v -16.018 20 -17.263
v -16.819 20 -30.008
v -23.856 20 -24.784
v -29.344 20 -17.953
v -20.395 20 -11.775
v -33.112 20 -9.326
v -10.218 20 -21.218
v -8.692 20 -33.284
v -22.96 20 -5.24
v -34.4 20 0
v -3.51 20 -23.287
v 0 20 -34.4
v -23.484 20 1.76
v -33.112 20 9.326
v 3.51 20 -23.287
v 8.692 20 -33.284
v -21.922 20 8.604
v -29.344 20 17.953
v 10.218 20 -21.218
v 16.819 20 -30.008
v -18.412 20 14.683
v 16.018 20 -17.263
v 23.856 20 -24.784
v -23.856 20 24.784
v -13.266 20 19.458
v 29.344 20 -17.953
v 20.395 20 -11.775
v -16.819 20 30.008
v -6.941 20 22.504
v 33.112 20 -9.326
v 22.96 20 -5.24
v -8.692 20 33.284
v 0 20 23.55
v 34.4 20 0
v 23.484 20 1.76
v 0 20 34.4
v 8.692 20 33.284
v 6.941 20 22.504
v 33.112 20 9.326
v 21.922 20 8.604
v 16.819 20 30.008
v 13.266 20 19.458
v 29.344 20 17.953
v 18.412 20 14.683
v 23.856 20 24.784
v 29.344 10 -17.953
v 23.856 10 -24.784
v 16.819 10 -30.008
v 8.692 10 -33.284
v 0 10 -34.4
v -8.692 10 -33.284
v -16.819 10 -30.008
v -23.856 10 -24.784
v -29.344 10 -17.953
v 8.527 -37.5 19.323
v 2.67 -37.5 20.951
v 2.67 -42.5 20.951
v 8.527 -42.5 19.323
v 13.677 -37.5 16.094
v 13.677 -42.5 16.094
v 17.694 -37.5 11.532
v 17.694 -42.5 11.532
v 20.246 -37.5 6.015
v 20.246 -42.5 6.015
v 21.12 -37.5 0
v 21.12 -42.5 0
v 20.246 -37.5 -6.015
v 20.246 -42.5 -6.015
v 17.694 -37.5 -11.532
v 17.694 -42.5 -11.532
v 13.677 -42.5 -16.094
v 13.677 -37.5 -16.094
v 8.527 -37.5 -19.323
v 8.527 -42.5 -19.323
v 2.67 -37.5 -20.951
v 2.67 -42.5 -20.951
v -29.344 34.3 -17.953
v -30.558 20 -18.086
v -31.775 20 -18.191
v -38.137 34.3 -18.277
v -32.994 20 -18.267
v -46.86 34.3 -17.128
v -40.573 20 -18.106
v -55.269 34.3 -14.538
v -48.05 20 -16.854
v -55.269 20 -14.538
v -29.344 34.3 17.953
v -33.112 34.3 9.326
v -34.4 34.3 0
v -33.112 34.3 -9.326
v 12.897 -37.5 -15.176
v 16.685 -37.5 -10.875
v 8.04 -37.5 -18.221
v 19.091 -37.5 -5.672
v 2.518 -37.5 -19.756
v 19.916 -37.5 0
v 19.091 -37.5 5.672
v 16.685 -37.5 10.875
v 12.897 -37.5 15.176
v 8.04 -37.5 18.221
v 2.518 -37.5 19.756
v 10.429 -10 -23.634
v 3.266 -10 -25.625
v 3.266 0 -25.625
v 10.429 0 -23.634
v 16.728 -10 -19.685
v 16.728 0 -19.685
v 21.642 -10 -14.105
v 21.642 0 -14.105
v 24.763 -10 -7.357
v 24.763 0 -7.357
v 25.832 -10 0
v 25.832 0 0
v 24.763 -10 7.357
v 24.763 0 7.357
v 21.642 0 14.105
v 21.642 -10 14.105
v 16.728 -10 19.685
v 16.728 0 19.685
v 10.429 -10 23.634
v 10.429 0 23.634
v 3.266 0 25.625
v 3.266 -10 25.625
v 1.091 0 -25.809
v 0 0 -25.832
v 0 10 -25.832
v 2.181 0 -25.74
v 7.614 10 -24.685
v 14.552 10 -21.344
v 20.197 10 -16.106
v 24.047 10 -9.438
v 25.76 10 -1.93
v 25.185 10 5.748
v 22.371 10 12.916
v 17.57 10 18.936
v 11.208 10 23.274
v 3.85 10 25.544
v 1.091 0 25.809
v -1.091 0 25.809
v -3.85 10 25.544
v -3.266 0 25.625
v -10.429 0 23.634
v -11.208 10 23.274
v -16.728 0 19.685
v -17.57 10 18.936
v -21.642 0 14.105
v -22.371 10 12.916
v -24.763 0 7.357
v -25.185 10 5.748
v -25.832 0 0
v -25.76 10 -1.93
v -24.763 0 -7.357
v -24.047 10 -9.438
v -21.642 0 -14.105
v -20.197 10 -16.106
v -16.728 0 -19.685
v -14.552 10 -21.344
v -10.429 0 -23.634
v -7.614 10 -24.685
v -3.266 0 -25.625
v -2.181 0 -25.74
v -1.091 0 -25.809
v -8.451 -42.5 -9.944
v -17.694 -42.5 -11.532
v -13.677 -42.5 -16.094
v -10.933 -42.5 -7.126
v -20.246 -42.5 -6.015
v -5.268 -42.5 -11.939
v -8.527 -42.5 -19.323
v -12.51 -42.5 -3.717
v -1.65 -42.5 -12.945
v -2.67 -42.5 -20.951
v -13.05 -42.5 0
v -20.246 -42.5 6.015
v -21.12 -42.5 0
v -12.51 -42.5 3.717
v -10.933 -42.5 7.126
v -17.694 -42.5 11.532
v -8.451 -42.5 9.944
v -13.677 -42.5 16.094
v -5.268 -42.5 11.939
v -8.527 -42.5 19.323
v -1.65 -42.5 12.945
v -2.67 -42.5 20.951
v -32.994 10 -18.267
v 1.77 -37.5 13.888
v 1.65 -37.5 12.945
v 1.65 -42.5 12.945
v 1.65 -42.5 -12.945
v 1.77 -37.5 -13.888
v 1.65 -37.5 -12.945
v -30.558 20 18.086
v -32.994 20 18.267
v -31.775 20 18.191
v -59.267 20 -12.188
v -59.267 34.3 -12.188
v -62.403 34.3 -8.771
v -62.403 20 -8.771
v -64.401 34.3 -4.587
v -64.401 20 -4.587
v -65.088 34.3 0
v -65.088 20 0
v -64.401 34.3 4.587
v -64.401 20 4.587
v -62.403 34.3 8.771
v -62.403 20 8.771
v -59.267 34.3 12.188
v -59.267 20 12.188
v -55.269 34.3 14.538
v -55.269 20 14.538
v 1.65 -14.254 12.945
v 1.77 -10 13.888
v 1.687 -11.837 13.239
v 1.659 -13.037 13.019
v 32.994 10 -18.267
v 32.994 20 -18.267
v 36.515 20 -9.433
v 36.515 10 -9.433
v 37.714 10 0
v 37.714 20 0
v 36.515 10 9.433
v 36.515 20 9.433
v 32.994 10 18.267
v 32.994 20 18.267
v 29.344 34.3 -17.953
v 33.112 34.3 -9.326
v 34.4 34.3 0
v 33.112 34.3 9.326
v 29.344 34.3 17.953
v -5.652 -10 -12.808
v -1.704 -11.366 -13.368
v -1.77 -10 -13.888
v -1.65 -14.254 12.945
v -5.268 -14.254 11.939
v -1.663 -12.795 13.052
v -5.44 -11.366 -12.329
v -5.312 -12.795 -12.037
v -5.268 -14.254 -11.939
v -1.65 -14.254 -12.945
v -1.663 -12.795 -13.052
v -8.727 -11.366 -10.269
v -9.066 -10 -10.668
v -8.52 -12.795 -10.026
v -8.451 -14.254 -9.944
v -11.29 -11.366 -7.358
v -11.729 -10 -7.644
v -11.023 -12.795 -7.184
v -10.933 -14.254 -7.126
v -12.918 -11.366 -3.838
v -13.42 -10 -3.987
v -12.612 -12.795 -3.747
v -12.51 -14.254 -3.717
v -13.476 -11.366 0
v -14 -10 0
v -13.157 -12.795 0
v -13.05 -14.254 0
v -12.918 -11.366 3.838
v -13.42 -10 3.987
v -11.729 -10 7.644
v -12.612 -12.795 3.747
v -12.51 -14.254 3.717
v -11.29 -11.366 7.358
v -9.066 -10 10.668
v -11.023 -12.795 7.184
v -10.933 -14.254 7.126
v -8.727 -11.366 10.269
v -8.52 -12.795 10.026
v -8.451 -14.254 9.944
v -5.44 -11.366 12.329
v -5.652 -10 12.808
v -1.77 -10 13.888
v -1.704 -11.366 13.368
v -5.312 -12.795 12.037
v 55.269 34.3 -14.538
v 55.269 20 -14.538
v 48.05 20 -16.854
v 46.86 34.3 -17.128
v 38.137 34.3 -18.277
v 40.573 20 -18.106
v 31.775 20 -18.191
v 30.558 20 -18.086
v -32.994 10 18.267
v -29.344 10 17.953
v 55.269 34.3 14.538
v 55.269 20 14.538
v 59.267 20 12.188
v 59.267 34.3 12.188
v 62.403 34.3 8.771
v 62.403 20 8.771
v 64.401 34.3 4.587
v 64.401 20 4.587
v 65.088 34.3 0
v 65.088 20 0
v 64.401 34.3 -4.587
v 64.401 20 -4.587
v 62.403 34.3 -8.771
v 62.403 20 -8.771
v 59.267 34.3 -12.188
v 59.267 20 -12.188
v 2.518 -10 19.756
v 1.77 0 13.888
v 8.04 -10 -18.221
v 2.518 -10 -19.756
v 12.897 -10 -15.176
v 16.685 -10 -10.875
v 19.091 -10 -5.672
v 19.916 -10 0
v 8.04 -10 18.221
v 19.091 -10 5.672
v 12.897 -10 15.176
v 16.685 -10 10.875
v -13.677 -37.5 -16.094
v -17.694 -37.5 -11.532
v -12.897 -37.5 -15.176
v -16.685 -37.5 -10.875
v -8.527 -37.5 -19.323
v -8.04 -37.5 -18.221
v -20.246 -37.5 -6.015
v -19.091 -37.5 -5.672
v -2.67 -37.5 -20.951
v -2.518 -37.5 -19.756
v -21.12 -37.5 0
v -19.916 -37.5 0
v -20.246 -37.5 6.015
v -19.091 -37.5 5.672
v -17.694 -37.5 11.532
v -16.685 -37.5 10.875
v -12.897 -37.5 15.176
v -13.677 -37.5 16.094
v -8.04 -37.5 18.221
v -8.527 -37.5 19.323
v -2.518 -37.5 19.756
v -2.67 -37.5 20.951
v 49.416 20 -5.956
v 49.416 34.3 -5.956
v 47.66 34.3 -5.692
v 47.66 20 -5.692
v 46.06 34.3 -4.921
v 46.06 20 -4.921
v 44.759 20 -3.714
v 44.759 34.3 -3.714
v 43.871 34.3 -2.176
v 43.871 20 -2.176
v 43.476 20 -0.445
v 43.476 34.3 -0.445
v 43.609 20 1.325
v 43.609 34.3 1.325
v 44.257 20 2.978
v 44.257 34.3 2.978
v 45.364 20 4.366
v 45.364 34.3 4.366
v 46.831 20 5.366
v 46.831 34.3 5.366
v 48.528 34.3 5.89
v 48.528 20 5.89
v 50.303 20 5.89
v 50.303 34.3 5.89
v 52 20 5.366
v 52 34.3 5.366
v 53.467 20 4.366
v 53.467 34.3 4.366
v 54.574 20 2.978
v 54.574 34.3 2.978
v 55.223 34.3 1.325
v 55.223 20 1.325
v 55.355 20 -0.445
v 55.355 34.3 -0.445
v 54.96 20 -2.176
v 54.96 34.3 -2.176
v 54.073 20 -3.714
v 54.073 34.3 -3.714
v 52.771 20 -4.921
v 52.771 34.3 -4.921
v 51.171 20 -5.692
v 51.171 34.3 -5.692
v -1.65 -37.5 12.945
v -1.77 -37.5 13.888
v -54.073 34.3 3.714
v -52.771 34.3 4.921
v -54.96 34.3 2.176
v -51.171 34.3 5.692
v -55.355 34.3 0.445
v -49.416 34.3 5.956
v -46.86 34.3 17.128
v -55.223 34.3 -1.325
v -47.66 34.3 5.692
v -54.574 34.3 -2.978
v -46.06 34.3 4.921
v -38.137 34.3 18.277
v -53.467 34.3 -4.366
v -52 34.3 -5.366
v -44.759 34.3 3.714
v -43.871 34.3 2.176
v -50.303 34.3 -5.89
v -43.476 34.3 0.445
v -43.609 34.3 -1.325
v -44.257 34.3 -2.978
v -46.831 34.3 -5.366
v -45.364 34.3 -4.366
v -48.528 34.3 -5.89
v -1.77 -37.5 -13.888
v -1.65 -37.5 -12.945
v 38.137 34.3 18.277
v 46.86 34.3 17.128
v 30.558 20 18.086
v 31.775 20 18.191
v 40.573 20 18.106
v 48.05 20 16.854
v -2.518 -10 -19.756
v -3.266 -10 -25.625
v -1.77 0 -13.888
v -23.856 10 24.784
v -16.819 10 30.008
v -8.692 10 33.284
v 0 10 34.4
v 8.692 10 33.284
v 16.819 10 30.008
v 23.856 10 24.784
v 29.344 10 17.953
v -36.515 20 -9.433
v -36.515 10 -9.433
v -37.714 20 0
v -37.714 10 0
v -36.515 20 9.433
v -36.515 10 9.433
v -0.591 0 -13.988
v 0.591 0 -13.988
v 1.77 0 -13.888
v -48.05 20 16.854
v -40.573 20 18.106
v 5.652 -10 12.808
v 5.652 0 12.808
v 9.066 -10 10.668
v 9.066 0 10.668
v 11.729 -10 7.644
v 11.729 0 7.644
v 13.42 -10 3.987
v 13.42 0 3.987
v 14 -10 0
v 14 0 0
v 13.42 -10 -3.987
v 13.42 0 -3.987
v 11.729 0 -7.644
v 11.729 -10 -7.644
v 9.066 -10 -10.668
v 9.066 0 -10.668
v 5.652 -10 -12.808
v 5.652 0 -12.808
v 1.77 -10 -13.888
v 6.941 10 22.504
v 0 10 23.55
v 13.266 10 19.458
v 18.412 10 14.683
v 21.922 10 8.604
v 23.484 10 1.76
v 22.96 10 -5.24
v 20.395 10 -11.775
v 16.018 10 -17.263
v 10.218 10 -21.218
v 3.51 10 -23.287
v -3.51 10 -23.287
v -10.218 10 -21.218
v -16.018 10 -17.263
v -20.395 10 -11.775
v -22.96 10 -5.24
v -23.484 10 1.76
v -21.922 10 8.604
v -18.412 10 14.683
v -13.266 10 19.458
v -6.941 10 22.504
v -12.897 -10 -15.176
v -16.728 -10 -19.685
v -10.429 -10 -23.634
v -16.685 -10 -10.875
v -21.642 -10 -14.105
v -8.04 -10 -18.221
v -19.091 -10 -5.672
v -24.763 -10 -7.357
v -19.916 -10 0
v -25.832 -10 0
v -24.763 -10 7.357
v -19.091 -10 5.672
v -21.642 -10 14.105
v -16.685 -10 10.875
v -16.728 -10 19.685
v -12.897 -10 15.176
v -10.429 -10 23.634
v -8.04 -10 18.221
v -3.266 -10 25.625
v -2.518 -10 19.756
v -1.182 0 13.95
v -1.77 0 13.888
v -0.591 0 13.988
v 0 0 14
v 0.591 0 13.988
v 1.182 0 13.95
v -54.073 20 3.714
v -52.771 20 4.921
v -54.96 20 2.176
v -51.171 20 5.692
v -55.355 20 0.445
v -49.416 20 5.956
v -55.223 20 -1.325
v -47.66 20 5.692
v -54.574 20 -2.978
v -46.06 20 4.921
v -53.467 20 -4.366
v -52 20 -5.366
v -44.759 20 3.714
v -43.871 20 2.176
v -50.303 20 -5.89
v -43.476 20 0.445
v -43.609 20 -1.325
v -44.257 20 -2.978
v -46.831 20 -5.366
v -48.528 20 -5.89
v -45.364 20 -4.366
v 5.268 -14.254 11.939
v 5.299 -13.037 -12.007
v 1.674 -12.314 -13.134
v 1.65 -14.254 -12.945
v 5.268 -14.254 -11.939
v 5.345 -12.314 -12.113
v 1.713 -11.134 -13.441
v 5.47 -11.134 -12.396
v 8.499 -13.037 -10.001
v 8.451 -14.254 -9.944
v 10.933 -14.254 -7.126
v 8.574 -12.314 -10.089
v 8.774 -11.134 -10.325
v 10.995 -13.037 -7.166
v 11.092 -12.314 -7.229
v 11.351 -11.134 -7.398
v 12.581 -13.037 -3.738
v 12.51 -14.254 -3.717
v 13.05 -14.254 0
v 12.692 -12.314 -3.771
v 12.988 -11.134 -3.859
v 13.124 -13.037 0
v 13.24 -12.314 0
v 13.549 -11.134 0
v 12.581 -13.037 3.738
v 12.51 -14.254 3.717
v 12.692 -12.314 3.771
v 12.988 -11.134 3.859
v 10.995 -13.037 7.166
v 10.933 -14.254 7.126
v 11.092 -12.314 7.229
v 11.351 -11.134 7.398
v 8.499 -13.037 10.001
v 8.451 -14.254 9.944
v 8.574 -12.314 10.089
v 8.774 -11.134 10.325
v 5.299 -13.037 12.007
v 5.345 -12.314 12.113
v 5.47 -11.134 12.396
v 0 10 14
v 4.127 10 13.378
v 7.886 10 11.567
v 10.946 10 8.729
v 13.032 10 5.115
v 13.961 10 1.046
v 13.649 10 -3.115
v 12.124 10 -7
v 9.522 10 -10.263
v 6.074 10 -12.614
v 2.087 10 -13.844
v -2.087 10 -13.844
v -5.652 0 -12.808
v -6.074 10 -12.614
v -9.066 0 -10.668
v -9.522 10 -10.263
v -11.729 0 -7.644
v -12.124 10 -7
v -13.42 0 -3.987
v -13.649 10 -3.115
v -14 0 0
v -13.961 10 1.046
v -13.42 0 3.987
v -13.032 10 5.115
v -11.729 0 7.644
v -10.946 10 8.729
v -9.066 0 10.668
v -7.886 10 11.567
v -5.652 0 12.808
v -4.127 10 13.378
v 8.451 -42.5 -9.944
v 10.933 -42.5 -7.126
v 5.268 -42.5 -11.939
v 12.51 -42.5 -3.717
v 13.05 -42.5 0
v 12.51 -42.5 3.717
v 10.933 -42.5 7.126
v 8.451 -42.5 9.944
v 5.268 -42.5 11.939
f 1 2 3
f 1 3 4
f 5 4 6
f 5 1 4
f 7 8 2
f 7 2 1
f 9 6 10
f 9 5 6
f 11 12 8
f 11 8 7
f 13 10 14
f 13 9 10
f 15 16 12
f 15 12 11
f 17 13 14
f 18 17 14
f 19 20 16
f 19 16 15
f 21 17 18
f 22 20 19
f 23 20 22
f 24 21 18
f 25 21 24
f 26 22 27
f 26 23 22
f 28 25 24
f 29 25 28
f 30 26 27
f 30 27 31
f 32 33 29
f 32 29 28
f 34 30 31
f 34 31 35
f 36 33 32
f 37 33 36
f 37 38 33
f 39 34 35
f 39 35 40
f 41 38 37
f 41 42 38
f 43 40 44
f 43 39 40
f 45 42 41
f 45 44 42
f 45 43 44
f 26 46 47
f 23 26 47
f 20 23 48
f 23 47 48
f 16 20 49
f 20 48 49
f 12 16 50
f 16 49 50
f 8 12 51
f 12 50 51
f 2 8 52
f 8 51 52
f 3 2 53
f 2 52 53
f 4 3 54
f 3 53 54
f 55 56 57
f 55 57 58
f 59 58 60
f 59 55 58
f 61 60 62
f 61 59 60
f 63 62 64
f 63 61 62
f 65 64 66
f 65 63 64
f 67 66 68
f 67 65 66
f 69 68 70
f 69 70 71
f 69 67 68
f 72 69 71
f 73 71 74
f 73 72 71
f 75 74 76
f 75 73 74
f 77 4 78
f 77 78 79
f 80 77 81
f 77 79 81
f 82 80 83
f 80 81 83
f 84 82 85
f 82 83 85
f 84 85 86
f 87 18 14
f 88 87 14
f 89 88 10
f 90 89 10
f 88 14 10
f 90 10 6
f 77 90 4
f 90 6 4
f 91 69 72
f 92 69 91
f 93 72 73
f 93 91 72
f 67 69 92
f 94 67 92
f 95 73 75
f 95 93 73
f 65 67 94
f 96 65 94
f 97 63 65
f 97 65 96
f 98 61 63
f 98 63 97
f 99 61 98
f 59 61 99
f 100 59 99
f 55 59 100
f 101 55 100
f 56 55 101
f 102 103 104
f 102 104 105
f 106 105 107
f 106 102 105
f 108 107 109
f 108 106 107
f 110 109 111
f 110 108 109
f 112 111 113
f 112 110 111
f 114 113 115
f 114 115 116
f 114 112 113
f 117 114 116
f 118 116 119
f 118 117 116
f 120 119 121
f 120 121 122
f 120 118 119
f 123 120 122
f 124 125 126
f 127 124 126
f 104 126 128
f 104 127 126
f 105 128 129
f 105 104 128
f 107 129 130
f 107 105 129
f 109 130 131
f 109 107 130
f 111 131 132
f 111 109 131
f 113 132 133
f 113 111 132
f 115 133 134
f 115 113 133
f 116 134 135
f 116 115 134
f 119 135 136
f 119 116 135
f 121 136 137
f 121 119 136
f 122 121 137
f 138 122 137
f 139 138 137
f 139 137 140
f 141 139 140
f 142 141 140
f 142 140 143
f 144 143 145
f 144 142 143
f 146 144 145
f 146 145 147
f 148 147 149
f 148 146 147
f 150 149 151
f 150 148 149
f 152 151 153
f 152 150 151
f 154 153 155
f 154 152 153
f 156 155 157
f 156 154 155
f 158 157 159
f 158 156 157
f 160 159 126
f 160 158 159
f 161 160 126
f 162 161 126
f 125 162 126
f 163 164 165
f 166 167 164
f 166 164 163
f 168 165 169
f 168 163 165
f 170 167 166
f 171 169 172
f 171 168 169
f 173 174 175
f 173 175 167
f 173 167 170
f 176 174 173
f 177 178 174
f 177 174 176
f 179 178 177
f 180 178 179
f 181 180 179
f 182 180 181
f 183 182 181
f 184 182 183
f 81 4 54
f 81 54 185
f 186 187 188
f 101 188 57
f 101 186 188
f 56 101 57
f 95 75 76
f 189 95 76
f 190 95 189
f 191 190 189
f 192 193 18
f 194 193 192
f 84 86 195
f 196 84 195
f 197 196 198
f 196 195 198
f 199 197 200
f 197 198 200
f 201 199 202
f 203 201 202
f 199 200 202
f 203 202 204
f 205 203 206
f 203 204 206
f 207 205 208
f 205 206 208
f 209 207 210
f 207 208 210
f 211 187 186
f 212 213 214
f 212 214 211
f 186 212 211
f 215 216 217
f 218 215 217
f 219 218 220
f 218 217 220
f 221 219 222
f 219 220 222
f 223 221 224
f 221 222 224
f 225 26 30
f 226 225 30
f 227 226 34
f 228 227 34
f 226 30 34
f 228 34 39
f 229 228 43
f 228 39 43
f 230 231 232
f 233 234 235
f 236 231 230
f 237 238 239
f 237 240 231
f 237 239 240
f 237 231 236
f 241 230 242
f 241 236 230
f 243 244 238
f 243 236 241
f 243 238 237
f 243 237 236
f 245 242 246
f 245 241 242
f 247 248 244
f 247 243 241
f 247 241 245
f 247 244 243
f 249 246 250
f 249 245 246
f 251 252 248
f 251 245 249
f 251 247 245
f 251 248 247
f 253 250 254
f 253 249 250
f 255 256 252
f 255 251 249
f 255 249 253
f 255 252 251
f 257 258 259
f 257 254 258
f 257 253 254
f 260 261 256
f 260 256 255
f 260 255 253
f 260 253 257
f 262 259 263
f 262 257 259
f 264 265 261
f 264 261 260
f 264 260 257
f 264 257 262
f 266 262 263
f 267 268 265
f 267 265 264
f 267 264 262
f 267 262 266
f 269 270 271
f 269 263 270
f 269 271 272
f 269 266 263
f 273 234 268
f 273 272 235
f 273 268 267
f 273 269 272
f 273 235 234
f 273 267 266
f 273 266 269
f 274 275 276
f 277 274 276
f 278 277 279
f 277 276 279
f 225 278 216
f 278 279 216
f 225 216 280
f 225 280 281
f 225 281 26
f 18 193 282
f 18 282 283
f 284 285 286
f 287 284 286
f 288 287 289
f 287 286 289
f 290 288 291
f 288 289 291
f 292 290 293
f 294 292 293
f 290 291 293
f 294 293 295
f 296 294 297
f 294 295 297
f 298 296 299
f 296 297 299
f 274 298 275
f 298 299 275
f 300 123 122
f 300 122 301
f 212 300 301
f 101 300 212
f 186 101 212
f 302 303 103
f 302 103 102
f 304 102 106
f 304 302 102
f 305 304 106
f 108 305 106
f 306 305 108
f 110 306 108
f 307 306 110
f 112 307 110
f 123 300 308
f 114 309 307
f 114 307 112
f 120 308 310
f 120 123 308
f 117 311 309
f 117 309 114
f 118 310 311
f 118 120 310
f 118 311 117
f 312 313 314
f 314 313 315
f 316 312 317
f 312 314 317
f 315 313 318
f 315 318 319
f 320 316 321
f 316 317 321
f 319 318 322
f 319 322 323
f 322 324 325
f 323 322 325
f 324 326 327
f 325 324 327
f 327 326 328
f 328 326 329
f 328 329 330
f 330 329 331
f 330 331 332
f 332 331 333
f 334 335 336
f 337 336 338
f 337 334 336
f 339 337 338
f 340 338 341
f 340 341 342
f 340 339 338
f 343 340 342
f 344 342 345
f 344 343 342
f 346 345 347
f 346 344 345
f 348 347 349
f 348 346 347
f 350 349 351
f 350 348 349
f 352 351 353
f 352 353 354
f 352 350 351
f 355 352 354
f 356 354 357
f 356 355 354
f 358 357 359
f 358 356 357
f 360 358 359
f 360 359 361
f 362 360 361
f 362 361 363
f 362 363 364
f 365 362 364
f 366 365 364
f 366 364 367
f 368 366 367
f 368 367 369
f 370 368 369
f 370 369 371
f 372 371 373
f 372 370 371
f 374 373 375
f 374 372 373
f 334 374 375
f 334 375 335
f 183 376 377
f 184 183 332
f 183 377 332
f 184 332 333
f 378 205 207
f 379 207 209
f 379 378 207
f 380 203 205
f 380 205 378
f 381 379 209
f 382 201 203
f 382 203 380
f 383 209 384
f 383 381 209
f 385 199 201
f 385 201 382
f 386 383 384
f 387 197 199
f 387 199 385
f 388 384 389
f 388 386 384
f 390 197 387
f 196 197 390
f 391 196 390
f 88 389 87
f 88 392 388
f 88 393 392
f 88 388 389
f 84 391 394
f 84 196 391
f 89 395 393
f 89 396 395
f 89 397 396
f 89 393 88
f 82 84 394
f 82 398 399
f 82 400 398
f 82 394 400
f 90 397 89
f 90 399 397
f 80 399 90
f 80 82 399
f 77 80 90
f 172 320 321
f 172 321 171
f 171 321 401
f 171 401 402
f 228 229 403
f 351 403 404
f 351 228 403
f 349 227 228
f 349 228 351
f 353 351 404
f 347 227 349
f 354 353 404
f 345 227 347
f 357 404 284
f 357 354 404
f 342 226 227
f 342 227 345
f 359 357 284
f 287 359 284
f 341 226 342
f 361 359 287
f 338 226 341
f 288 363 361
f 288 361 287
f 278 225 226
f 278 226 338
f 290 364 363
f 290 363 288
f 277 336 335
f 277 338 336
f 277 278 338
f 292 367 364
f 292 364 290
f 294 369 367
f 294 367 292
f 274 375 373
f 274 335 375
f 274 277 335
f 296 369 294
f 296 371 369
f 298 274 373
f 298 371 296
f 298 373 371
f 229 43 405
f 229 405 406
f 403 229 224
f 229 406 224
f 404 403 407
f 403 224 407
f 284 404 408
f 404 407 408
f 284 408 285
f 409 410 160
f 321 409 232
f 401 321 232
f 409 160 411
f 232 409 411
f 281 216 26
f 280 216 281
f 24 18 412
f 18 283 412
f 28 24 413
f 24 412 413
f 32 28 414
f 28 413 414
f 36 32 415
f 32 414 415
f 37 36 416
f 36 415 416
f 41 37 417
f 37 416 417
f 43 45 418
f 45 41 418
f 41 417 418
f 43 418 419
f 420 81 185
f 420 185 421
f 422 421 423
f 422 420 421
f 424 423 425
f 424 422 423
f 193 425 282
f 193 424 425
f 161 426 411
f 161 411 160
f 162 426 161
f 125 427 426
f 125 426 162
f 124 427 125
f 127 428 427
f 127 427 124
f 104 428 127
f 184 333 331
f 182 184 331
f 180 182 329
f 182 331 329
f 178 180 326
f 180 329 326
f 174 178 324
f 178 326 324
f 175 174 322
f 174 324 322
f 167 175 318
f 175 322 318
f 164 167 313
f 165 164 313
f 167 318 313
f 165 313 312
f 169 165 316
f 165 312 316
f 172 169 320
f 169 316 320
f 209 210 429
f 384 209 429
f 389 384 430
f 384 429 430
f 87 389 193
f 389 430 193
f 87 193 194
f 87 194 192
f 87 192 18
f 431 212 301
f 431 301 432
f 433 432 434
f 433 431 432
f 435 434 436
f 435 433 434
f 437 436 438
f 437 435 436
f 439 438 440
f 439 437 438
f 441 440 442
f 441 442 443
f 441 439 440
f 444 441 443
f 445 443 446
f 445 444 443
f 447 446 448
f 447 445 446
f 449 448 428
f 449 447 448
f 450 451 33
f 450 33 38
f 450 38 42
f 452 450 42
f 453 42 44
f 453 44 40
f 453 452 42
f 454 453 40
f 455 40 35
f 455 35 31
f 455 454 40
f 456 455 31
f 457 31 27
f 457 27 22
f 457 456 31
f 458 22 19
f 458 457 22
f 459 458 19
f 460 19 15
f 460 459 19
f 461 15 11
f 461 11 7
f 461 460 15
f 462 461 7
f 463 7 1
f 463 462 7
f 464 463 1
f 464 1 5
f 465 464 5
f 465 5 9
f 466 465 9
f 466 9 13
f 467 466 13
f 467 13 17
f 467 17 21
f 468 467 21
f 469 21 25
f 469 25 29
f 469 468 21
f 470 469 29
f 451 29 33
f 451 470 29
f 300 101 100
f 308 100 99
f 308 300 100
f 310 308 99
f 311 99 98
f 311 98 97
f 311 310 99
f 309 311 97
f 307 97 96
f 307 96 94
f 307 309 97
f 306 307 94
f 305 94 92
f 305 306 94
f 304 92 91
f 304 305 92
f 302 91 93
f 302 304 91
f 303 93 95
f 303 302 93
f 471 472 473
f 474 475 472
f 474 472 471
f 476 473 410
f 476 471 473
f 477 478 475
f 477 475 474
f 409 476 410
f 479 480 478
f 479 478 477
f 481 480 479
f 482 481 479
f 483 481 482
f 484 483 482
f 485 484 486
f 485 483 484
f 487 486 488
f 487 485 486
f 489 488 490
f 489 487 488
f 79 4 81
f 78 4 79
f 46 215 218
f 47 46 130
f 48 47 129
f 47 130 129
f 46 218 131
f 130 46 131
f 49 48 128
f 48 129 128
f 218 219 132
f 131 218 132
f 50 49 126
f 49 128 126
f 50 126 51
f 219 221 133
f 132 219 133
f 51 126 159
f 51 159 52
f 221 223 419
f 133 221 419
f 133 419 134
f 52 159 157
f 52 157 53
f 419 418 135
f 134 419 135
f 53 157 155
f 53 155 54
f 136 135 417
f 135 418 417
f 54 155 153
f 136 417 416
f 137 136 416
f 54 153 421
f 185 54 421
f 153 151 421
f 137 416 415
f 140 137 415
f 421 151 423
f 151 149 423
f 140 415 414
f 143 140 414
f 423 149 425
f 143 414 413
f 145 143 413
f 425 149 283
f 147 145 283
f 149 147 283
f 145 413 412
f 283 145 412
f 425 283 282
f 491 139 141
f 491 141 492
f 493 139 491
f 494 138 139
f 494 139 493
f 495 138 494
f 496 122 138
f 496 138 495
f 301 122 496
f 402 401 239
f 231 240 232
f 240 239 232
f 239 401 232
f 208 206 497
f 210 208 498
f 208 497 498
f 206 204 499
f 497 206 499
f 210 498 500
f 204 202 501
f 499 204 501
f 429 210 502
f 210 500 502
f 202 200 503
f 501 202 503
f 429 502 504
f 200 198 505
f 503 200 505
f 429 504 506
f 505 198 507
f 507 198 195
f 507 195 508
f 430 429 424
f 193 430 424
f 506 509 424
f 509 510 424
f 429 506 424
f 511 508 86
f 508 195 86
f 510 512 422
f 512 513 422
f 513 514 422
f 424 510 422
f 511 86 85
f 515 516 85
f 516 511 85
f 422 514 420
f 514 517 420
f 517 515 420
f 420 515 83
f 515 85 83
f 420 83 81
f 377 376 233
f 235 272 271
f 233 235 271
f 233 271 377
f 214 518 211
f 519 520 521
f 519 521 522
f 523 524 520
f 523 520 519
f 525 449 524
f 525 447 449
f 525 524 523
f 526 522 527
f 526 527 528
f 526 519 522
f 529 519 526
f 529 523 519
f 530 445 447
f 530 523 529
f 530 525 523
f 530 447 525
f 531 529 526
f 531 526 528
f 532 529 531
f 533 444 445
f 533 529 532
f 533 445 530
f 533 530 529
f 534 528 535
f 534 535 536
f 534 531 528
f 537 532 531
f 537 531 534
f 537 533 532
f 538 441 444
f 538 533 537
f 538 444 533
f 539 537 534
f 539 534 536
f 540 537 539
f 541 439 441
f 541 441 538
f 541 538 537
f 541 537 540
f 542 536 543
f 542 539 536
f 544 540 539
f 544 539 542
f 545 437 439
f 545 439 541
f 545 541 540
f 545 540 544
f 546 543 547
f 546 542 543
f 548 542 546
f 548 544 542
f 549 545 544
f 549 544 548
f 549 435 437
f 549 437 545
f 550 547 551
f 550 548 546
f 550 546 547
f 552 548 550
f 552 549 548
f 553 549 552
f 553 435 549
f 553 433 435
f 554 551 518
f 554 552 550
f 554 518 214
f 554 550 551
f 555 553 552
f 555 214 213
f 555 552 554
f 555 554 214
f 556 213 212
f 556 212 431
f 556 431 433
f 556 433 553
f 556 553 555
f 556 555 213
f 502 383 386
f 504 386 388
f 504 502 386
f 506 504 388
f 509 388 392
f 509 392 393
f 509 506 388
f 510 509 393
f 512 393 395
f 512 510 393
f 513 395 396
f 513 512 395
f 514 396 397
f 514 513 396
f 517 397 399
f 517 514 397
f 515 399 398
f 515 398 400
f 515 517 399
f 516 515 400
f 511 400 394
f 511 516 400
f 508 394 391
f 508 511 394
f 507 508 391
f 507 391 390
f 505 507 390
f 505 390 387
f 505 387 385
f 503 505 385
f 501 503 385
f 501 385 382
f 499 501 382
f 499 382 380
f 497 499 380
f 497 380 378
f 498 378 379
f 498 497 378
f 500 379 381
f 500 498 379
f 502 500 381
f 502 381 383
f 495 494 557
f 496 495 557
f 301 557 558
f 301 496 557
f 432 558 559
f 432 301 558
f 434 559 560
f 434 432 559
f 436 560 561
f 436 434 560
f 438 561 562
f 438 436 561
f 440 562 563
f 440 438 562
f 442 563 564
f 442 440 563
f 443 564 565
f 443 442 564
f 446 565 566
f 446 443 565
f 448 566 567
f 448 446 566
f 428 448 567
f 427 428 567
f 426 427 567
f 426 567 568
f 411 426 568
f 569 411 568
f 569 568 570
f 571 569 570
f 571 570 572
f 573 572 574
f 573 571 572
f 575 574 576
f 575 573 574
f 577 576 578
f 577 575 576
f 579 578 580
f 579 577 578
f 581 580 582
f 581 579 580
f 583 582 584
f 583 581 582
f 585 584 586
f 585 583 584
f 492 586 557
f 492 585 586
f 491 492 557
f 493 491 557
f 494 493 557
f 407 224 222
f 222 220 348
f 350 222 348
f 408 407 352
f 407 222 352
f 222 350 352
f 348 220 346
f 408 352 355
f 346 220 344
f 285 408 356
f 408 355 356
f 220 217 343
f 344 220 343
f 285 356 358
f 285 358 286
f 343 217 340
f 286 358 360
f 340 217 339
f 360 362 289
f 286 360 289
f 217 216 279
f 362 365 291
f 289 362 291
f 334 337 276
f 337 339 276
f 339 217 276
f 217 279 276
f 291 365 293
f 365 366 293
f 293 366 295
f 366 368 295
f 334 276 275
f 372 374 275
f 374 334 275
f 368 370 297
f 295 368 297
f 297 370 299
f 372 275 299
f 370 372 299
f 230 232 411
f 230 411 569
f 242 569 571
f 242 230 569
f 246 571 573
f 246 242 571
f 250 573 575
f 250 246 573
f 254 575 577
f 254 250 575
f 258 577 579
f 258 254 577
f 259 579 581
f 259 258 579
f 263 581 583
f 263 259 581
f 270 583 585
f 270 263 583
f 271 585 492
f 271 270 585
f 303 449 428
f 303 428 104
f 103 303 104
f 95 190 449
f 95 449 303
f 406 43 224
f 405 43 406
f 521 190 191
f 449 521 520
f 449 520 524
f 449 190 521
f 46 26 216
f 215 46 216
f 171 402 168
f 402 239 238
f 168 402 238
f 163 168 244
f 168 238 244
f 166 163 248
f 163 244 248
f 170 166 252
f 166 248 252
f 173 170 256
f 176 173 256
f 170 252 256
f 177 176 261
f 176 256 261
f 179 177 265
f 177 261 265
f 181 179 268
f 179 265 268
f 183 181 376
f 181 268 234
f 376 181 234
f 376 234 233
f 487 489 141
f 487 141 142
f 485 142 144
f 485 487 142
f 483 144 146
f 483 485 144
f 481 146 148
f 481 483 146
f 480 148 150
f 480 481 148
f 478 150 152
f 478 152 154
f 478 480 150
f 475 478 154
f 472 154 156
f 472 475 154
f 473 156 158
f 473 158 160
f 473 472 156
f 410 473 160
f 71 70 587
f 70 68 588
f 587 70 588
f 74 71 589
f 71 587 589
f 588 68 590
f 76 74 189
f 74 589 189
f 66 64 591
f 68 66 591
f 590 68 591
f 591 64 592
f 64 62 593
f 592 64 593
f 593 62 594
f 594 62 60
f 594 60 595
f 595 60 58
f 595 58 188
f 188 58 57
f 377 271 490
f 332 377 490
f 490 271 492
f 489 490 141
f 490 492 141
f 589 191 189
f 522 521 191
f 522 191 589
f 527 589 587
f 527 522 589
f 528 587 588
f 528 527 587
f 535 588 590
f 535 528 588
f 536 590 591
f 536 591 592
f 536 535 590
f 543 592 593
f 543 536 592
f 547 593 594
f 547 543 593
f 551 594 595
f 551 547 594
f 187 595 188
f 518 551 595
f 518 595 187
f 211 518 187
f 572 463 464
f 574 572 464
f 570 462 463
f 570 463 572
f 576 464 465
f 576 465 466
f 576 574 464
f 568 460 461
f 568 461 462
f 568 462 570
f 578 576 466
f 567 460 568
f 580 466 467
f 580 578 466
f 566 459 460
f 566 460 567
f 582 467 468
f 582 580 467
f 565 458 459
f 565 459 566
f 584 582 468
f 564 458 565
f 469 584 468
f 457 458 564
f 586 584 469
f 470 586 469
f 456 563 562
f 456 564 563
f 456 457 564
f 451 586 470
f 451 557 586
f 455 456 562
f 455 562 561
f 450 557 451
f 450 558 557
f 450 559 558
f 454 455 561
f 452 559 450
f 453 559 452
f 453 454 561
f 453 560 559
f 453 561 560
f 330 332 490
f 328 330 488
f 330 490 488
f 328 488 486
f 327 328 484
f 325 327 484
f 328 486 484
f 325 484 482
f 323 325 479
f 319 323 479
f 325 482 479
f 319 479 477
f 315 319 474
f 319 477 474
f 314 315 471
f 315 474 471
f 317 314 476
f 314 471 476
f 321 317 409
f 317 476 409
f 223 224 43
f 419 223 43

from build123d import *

# Parameters (mm, degrees)
SKETCH1_R             = 23.55
SKETCH1_R_2           = 14
BOSS_EXTRUDE4_DEPTH   = 10
SKETCH6_R             = 34.4
SKETCH6_R_2           = 23.55
BOSS_EXTRUDE5_DEPTH   = 10
SKETCH8_R             = 5.9563
BOSS_EXTRUDE7_DEPTH   = 14.3
BOSS_EXTRUDE7_2_DEPTH = 14.3
BOSS_EXTRUDE8_DEPTH   = 10
SKETCH10_R            = 25.832365573
SKETCH10_R_2          = 23.55
BOSS_EXTRUDE9_DEPTH   = 10
BOSS_EXTRUDE10_START  = 10
BOSS_EXTRUDE10_DEPTH  = 10
BOSS_EXTRUDE11_DEPTH  = 27.5
FILLET4_R             = 10
FILLET5_R             = 10
BOSS_EXTRUDE13_DEPTH  = 5


with BuildPart() as part:
    # Sketch1 → Boss-Extrude4 (new body)
    with BuildSketch(Plane(origin=(0, 0, 0), x_dir=(1, 0, 0), z_dir=(0, 1, 0))):
        with Locations(Location((0, 0, 0), (0, 0, 270))):
            Circle(SKETCH1_R)
        with Locations(Location((0, 0, 0), (0, 0, 270))):
            Circle(SKETCH1_R_2, mode=Mode.SUBTRACT)
    extrude(amount=BOSS_EXTRUDE4_DEPTH)



with BuildPart() as body_2:
    # Sketch6 → Boss-Extrude5 (new body)
    with BuildSketch(Plane(origin=(0, 10, 0), x_dir=(1, 0, 0), z_dir=(0, 1, 0))):
        with Locations(Location((0, 0, 0), (0, 0, 270))):
            Circle(SKETCH6_R)
        with Locations(Location((0, 0, 0), (0, 0, 270))):
            Circle(SKETCH6_R_2, mode=Mode.SUBTRACT)
    extrude(amount=BOSS_EXTRUDE5_DEPTH)



with BuildPart() as body_3:
    # Sketch8 → Boss-Extrude7 (new body)
    with BuildSketch(Plane(origin=(0, 20, 0), x_dir=(1, 0, 0), z_dir=(0, 1, 0))):
        with BuildLine():
            ThreePointArc((-55.268702708, 14.537801572), (-65.0875, 0), (-55.268702708, -14.537801572))
            ThreePointArc((-55.268702708, -14.537801572), (-42.522384328, -17.885755457), (-29.343880761, -17.952622702))
            ThreePointArc((-29.343880761, -17.952622702), (-34.4, 0), (-29.343880761, 17.952622702))
            ThreePointArc((-29.343880761, 17.952622702), (-42.522384328, 17.885755457), (-55.268702708, 14.537801572))
        make_face()
        with Locations(Location((-49.4157, 0, 0), (0, 0, 270))):
            Circle(SKETCH8_R, mode=Mode.SUBTRACT)
    extrude(amount=BOSS_EXTRUDE7_DEPTH)


with BuildPart() as body_4:
    # Sketch8 → Boss-Extrude7 2 (new body)
    with BuildSketch(Plane(origin=(0, 20, 0), x_dir=(1, 0, 0), z_dir=(0, 1, 0))):
        with BuildLine():
            ThreePointArc((55.268702708, 14.537801572), (42.522384328, 17.885755457), (29.343880761, 17.952622702))
            ThreePointArc((29.343880761, 17.952622702), (34.4, 0), (29.343880761, -17.952622702))
            ThreePointArc((29.343880761, -17.952622702), (42.522384328, -17.885755457), (55.268702708, -14.537801572))
            ThreePointArc((55.268702708, -14.537801572), (65.0875, 0), (55.268702708, 14.537801572))
        make_face()
        with Locations(Location((49.4157, 0, 0), (0, 0, 90))):
            Circle(SKETCH8_R, mode=Mode.SUBTRACT)
    extrude(amount=BOSS_EXTRUDE7_2_DEPTH)


with BuildPart() as body_2_1:
    add(body_2.part)

    add(body_3.part)  # Boss-Extrude8 merges body 3

    add(body_4.part)  # Boss-Extrude8 merges body 4
    # Sketch9 → Boss-Extrude8 (add)
    with BuildSketch(Plane.XZ.offset(-20)):
        with BuildLine():
            Line((-32.994341825, 18.26698083), (-29.343880761, 17.952622702))
            ThreePointArc((-29.343880761, 17.952622702), (-34.4, 0), (-29.343880761, -17.952622702))
            Line((-29.343880761, -17.952622702), (-32.994341825, -18.26698083))
            ThreePointArc((-32.994341825, -18.26698083), (-37.713514569, 0), (-32.994341825, 18.26698083))
        make_face()
        with BuildLine():
            Line((32.994341825, 18.26698083), (29.343880761, 17.952622702))
            ThreePointArc((29.343880761, 17.952622702), (34.4, 0), (29.343880761, -17.952622702))
            Line((29.343880761, -17.952622702), (32.994341825, -18.26698083))
            ThreePointArc((32.994341825, -18.26698083), (37.713514569, 0), (32.994341825, 18.26698083))
        make_face()
    extrude(amount=BOSS_EXTRUDE8_DEPTH)


with BuildPart() as part_1:
    add(part.part)

    add(body_2_1.part)  # Boss-Extrude9 merges body 2
    # Sketch10 → Boss-Extrude9 (add)
    with BuildSketch(Plane.XZ):
        with Locations(Location((0, 0, 0), (0, 0, 270))):
            Circle(SKETCH10_R)
        with Locations(Location((0, 0, 0), (0, 0, 90))):
            Circle(SKETCH10_R_2, mode=Mode.SUBTRACT)
    extrude(amount=-BOSS_EXTRUDE9_DEPTH)

    # Sketch11 → Boss-Extrude10 (add)
    with BuildSketch(Plane.XZ.offset(BOSS_EXTRUDE10_START)):
        with BuildLine():
            Line((-1.769995947, 13.887660507), (-3.265941597, 25.625080225))
            ThreePointArc((-3.265941597, 25.625080225), (-25.832365573, 0), (-3.265941597, -25.625080225))
            Line((-3.265941597, -25.625080225), (-1.769995947, -13.887660507))
            ThreePointArc((-1.769995947, -13.887660507), (-14, 0), (-1.769995947, 13.887660507))
        make_face()
        with BuildLine():
            Line((1.769995947, -13.887660507), (3.265941597, -25.625080225))
            ThreePointArc((3.265941597, -25.625080225), (25.832365573, 0), (3.265941597, 25.625080225))
            Line((3.265941597, 25.625080225), (1.769995947, 13.887660507))
            ThreePointArc((1.769995947, 13.887660507), (14, 0), (1.769995947, -13.887660507))
        make_face()
    extrude(amount=-BOSS_EXTRUDE10_DEPTH)

    # Sketch12 → Boss-Extrude11 (add)
    with BuildSketch(Plane.XZ.offset(10)):
        with BuildLine():
            Line((-1.769995947, 13.887660507), (-2.517968772, 19.756370366))
            ThreePointArc((-2.517968772, 19.756370366), (-19.916182786, 0), (-2.517968772, -19.756370366))
            Line((-2.517968772, -19.756370366), (-1.769995947, -13.887660507))
            Line((-1.769995947, -13.887660507), (-1.649889079, -12.945283544))
            ThreePointArc((-1.649889079, -12.945283544), (-13.05, 0), (-1.649889079, 12.945283544))
            Line((-1.649889079, 12.945283544), (-1.769995947, 13.887660507))
        make_face()
        with BuildLine():
            Line((1.769995947, 13.887660507), (2.517968772, 19.756370366))
            ThreePointArc((2.517968772, 19.756370366), (19.916182786, 0), (2.517968772, -19.756370366))
            Line((2.517968772, -19.756370366), (1.769995947, -13.887660507))
            Line((1.769995947, -13.887660507), (1.649889079, -12.945283544))
            ThreePointArc((1.649889079, -12.945283544), (13.05, 0), (1.649889079, 12.945283544))
            Line((1.649889079, 12.945283544), (1.769995947, 13.887660507))
        make_face()
    extrude(amount=BOSS_EXTRUDE11_DEPTH)

    # Fillet4
    # the kernel refuses this fillet: 10 mm, written as the material it takes off along each edge
    with BuildSketch(Plane(origin=(0, -10, 0), x_dir=(-0.12642828192325106, 0, -0.9919757504747456), z_dir=(0.9919757504747456, 0, -0.12642828192325106))) as fillet4_piece_1:
        with BuildLine():
            CenterArc((23.05, -4.254115654), FILLET4_R, 154.823283059, 25.176716941)
            Line((13.05, -4.254115654), (12.85, -4.254115654))
            Line((12.85, -4.254115654), (12.85, 0))
            Line((12.85, 0), (13.05, 0.2))
            ThreePointArc((13.05, 0.2), (13.525, 0.2), (13.819, 0.085082313))
            Line((13.819, 0.085082313), (14, 0))
        make_face()
    revolve(axis=Axis((0, -10, 0), (0, 1, 0)), revolution_arc=165.473510519, mode=Mode.SUBTRACT)

    # Fillet5
    # the kernel refuses this fillet: 10 mm, written as the material it takes off along each edge
    with BuildSketch(Plane(origin=(0, -10, 0), x_dir=(-0.6360006800114754, 0, -0.7716884961076852), z_dir=(-0.7716884961076852, 0, 0.6360006800114754))) as fillet5_piece_1:
        with BuildLine():
            CenterArc((23.05, 4.254115654), FILLET5_R, 180, 25.176716941)
            Line((13.05, 4.254115654), (12.85, 4.254115654))
            Line((12.85, 4.254115654), (12.85, 0))
            Line((12.85, 0), (13.05, -0.2))
            ThreePointArc((13.05, -0.2), (13.525, -0.2), (13.819, -0.085082313))
            Line((13.819, -0.085082313), (14, 0))
        make_face()
    revolve(axis=Axis((0, -10, 0), (0, -1, 0)), revolution_arc=258.988485214, mode=Mode.SUBTRACT)

    # Sketch14 → Boss-Extrude13 (add)
    with BuildSketch(Plane.XZ.offset(37.5)):
        with BuildLine():
            Line((-1.649889079, 12.945283544), (-2.670219685, 20.950954455))
            ThreePointArc((-2.670219685, 20.950954455), (-21.120430056, 0), (-2.670219685, -20.950954455))
            Line((-2.670219685, -20.950954455), (-1.649889079, -12.945283544))
            ThreePointArc((-1.649889079, -12.945283544), (-13.05, 0), (-1.649889079, 12.945283544))
        make_face()
        with BuildLine():
            Line((2.670219685, -20.950954455), (1.649889079, -12.945283544))
            ThreePointArc((1.649889079, -12.945283544), (13.05, 0), (1.649889079, 12.945283544))
            Line((1.649889079, 12.945283544), (2.670219685, 20.950954455))
            ThreePointArc((2.670219685, 20.950954455), (21.120430056, 0), (2.670219685, -20.950954455))
        make_face()
    extrude(amount=BOSS_EXTRUDE13_DEPTH)


solid = part_1.part
